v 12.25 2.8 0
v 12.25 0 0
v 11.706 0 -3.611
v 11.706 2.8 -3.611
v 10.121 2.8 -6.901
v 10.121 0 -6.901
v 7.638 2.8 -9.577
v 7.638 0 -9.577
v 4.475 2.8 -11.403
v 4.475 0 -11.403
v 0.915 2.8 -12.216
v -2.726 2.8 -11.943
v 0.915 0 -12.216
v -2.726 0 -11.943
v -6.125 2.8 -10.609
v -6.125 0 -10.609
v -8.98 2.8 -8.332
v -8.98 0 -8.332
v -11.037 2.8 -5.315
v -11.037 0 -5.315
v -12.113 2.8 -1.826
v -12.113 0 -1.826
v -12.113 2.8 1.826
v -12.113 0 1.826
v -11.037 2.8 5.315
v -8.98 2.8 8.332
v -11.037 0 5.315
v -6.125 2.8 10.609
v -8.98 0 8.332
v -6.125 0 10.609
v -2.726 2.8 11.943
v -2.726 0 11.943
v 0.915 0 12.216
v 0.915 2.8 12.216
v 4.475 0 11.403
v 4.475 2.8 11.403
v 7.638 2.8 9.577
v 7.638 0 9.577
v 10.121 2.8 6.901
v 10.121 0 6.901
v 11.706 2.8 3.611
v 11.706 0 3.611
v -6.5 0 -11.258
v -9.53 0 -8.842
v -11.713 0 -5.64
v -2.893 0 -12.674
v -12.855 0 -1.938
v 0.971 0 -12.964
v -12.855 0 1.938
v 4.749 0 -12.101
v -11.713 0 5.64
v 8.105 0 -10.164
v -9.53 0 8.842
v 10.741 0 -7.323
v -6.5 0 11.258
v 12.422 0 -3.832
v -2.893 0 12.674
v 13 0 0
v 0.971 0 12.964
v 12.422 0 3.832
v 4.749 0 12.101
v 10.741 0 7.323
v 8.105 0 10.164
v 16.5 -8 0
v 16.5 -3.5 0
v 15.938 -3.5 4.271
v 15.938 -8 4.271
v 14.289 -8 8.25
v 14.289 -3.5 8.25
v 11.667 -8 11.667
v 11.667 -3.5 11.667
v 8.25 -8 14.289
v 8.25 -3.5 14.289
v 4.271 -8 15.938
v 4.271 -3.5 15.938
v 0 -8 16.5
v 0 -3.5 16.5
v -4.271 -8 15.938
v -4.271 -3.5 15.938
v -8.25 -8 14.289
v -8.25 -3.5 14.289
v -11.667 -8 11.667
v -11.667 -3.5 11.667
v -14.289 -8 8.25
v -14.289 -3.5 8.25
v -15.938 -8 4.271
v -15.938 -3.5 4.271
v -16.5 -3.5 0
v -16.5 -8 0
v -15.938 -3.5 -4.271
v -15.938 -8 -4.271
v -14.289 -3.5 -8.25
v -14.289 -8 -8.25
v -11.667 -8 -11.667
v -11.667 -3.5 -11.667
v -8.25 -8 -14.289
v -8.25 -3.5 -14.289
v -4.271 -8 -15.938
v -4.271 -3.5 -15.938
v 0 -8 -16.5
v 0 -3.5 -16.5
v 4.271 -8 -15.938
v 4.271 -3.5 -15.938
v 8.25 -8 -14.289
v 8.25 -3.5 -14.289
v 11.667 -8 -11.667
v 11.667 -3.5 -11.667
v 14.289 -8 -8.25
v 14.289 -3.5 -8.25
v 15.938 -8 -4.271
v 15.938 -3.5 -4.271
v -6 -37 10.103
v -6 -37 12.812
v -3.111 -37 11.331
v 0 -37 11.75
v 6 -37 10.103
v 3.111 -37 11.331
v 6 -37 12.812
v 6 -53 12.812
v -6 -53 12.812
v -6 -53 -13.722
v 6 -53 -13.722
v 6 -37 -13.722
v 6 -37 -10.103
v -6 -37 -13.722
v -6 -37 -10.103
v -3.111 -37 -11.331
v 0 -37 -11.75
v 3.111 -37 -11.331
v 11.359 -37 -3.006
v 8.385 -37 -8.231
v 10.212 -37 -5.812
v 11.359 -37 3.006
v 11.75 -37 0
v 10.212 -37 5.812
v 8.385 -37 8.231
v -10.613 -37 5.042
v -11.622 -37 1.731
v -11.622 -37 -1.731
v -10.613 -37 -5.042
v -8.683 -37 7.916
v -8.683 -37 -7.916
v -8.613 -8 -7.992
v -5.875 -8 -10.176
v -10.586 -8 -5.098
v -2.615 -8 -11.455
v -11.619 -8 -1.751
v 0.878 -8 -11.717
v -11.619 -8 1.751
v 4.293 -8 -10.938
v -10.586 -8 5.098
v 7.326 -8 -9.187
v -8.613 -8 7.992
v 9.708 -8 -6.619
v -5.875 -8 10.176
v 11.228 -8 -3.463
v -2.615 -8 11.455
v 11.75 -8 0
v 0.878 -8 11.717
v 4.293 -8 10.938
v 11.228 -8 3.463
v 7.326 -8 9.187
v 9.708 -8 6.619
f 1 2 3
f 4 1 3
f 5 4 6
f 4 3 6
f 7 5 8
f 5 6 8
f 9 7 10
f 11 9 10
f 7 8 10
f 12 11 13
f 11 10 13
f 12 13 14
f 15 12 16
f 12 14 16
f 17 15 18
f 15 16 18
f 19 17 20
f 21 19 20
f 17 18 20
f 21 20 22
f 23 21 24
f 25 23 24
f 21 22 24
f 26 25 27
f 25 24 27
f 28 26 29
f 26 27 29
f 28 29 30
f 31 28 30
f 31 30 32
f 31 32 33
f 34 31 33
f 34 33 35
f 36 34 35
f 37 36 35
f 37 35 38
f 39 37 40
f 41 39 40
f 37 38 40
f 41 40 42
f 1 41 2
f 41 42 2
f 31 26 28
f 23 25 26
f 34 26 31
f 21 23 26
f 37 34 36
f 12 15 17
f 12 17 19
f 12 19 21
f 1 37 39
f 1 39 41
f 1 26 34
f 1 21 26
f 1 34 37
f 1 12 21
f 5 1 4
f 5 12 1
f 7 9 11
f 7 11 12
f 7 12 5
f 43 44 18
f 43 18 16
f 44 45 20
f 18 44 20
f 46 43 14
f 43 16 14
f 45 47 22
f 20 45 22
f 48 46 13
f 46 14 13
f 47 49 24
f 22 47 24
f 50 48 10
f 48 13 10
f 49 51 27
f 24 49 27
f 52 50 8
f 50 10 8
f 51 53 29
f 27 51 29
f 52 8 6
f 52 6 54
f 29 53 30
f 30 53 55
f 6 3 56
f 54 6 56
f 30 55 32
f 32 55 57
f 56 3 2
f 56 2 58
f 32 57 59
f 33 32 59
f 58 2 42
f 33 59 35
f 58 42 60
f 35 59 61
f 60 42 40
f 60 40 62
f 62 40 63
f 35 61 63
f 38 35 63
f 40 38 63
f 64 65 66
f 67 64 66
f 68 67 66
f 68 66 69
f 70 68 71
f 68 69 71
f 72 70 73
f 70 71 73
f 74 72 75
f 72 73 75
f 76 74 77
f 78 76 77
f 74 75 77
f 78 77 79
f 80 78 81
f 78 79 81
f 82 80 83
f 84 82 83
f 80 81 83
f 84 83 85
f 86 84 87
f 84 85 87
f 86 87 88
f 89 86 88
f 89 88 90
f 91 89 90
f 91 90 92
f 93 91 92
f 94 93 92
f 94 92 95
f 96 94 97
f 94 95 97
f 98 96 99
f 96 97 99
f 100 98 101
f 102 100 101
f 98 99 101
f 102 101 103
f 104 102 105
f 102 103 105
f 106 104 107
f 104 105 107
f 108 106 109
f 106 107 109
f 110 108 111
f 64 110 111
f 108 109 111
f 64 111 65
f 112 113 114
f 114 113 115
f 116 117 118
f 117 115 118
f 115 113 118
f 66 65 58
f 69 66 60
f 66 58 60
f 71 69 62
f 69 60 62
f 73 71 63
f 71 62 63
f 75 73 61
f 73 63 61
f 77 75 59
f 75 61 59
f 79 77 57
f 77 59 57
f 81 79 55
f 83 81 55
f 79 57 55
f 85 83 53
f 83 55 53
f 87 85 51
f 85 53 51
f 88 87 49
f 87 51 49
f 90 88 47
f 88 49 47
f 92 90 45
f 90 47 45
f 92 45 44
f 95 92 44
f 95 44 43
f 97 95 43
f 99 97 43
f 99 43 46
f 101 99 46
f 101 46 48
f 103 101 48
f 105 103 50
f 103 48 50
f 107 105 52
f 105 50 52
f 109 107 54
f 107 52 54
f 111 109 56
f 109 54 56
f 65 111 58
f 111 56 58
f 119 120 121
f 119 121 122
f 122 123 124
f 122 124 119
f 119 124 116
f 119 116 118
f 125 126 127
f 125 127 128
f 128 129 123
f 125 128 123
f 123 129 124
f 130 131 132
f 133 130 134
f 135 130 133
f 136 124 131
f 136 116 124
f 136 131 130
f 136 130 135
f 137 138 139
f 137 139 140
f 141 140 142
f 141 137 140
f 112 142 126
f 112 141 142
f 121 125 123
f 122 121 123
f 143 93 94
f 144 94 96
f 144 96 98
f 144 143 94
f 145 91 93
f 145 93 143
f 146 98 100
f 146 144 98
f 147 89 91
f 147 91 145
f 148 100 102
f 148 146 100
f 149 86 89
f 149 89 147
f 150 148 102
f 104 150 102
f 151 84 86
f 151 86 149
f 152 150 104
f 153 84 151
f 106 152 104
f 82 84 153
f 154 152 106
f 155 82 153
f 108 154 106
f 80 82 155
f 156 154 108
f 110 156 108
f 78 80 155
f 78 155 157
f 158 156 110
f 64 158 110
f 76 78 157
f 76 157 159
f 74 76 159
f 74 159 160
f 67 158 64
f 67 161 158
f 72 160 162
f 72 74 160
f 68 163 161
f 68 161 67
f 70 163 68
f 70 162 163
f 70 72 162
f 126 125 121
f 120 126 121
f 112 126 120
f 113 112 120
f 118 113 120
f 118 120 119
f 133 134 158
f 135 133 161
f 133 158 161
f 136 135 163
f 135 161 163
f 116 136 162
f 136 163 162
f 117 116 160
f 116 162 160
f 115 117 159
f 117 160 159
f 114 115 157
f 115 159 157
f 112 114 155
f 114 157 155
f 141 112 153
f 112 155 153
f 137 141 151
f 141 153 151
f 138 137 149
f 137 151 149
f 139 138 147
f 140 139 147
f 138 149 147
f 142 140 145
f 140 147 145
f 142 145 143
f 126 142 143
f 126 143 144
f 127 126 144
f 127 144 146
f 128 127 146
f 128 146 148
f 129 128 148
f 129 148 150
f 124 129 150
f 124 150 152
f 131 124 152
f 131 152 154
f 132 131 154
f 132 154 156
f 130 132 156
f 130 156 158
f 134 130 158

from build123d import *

# Parameters (mm, degrees)
SKETCH1_R           = 12.25
BOSS_EXTRUDE1_DEPTH = 2.8
SKETCH2_R           = 16.5
BOSS_EXTRUDE2_DEPTH = 8
CHAMFER1_SIZE       = 3.5
SKETCH3_R           = 11.75
BOSS_EXTRUDE3_DEPTH = 29
SKETCH4_W           = 12
SKETCH4_H           = 26.533921206
BOSS_EXTRUDE4_DEPTH = 16


with BuildPart() as part:
    # Sketch1 → Boss-Extrude1 (new body)
    with BuildSketch(Plane(origin=(0, 0, 0), x_dir=(1, 0, 0), z_dir=(0, 1, 0))):
        Circle(SKETCH1_R)
    extrude(amount=BOSS_EXTRUDE1_DEPTH)

    # Sketch2 → Boss-Extrude2 (add)
    with BuildSketch(Plane.XZ):
        Circle(SKETCH2_R)
    extrude(amount=BOSS_EXTRUDE2_DEPTH)

    # Chamfer1
    chamfer1_edges = [part.edges().sort_by_distance(p)[0] for p in [
        (-16.5, 0, 0),
    ]]
    chamfer(chamfer1_edges, length=CHAMFER1_SIZE)

    # Sketch3 → Boss-Extrude3 (add)
    with BuildSketch(Plane.XZ.offset(8)):
        Circle(SKETCH3_R)
    extrude(amount=BOSS_EXTRUDE3_DEPTH)

    # Sketch4 → Boss-Extrude4 (add)
    with BuildSketch(Plane.XZ.offset(37)):
        with Locations((0, -0.455127293)):
            Rectangle(SKETCH4_W, SKETCH4_H)
    extrude(amount=BOSS_EXTRUDE4_DEPTH)


solid = part.part
